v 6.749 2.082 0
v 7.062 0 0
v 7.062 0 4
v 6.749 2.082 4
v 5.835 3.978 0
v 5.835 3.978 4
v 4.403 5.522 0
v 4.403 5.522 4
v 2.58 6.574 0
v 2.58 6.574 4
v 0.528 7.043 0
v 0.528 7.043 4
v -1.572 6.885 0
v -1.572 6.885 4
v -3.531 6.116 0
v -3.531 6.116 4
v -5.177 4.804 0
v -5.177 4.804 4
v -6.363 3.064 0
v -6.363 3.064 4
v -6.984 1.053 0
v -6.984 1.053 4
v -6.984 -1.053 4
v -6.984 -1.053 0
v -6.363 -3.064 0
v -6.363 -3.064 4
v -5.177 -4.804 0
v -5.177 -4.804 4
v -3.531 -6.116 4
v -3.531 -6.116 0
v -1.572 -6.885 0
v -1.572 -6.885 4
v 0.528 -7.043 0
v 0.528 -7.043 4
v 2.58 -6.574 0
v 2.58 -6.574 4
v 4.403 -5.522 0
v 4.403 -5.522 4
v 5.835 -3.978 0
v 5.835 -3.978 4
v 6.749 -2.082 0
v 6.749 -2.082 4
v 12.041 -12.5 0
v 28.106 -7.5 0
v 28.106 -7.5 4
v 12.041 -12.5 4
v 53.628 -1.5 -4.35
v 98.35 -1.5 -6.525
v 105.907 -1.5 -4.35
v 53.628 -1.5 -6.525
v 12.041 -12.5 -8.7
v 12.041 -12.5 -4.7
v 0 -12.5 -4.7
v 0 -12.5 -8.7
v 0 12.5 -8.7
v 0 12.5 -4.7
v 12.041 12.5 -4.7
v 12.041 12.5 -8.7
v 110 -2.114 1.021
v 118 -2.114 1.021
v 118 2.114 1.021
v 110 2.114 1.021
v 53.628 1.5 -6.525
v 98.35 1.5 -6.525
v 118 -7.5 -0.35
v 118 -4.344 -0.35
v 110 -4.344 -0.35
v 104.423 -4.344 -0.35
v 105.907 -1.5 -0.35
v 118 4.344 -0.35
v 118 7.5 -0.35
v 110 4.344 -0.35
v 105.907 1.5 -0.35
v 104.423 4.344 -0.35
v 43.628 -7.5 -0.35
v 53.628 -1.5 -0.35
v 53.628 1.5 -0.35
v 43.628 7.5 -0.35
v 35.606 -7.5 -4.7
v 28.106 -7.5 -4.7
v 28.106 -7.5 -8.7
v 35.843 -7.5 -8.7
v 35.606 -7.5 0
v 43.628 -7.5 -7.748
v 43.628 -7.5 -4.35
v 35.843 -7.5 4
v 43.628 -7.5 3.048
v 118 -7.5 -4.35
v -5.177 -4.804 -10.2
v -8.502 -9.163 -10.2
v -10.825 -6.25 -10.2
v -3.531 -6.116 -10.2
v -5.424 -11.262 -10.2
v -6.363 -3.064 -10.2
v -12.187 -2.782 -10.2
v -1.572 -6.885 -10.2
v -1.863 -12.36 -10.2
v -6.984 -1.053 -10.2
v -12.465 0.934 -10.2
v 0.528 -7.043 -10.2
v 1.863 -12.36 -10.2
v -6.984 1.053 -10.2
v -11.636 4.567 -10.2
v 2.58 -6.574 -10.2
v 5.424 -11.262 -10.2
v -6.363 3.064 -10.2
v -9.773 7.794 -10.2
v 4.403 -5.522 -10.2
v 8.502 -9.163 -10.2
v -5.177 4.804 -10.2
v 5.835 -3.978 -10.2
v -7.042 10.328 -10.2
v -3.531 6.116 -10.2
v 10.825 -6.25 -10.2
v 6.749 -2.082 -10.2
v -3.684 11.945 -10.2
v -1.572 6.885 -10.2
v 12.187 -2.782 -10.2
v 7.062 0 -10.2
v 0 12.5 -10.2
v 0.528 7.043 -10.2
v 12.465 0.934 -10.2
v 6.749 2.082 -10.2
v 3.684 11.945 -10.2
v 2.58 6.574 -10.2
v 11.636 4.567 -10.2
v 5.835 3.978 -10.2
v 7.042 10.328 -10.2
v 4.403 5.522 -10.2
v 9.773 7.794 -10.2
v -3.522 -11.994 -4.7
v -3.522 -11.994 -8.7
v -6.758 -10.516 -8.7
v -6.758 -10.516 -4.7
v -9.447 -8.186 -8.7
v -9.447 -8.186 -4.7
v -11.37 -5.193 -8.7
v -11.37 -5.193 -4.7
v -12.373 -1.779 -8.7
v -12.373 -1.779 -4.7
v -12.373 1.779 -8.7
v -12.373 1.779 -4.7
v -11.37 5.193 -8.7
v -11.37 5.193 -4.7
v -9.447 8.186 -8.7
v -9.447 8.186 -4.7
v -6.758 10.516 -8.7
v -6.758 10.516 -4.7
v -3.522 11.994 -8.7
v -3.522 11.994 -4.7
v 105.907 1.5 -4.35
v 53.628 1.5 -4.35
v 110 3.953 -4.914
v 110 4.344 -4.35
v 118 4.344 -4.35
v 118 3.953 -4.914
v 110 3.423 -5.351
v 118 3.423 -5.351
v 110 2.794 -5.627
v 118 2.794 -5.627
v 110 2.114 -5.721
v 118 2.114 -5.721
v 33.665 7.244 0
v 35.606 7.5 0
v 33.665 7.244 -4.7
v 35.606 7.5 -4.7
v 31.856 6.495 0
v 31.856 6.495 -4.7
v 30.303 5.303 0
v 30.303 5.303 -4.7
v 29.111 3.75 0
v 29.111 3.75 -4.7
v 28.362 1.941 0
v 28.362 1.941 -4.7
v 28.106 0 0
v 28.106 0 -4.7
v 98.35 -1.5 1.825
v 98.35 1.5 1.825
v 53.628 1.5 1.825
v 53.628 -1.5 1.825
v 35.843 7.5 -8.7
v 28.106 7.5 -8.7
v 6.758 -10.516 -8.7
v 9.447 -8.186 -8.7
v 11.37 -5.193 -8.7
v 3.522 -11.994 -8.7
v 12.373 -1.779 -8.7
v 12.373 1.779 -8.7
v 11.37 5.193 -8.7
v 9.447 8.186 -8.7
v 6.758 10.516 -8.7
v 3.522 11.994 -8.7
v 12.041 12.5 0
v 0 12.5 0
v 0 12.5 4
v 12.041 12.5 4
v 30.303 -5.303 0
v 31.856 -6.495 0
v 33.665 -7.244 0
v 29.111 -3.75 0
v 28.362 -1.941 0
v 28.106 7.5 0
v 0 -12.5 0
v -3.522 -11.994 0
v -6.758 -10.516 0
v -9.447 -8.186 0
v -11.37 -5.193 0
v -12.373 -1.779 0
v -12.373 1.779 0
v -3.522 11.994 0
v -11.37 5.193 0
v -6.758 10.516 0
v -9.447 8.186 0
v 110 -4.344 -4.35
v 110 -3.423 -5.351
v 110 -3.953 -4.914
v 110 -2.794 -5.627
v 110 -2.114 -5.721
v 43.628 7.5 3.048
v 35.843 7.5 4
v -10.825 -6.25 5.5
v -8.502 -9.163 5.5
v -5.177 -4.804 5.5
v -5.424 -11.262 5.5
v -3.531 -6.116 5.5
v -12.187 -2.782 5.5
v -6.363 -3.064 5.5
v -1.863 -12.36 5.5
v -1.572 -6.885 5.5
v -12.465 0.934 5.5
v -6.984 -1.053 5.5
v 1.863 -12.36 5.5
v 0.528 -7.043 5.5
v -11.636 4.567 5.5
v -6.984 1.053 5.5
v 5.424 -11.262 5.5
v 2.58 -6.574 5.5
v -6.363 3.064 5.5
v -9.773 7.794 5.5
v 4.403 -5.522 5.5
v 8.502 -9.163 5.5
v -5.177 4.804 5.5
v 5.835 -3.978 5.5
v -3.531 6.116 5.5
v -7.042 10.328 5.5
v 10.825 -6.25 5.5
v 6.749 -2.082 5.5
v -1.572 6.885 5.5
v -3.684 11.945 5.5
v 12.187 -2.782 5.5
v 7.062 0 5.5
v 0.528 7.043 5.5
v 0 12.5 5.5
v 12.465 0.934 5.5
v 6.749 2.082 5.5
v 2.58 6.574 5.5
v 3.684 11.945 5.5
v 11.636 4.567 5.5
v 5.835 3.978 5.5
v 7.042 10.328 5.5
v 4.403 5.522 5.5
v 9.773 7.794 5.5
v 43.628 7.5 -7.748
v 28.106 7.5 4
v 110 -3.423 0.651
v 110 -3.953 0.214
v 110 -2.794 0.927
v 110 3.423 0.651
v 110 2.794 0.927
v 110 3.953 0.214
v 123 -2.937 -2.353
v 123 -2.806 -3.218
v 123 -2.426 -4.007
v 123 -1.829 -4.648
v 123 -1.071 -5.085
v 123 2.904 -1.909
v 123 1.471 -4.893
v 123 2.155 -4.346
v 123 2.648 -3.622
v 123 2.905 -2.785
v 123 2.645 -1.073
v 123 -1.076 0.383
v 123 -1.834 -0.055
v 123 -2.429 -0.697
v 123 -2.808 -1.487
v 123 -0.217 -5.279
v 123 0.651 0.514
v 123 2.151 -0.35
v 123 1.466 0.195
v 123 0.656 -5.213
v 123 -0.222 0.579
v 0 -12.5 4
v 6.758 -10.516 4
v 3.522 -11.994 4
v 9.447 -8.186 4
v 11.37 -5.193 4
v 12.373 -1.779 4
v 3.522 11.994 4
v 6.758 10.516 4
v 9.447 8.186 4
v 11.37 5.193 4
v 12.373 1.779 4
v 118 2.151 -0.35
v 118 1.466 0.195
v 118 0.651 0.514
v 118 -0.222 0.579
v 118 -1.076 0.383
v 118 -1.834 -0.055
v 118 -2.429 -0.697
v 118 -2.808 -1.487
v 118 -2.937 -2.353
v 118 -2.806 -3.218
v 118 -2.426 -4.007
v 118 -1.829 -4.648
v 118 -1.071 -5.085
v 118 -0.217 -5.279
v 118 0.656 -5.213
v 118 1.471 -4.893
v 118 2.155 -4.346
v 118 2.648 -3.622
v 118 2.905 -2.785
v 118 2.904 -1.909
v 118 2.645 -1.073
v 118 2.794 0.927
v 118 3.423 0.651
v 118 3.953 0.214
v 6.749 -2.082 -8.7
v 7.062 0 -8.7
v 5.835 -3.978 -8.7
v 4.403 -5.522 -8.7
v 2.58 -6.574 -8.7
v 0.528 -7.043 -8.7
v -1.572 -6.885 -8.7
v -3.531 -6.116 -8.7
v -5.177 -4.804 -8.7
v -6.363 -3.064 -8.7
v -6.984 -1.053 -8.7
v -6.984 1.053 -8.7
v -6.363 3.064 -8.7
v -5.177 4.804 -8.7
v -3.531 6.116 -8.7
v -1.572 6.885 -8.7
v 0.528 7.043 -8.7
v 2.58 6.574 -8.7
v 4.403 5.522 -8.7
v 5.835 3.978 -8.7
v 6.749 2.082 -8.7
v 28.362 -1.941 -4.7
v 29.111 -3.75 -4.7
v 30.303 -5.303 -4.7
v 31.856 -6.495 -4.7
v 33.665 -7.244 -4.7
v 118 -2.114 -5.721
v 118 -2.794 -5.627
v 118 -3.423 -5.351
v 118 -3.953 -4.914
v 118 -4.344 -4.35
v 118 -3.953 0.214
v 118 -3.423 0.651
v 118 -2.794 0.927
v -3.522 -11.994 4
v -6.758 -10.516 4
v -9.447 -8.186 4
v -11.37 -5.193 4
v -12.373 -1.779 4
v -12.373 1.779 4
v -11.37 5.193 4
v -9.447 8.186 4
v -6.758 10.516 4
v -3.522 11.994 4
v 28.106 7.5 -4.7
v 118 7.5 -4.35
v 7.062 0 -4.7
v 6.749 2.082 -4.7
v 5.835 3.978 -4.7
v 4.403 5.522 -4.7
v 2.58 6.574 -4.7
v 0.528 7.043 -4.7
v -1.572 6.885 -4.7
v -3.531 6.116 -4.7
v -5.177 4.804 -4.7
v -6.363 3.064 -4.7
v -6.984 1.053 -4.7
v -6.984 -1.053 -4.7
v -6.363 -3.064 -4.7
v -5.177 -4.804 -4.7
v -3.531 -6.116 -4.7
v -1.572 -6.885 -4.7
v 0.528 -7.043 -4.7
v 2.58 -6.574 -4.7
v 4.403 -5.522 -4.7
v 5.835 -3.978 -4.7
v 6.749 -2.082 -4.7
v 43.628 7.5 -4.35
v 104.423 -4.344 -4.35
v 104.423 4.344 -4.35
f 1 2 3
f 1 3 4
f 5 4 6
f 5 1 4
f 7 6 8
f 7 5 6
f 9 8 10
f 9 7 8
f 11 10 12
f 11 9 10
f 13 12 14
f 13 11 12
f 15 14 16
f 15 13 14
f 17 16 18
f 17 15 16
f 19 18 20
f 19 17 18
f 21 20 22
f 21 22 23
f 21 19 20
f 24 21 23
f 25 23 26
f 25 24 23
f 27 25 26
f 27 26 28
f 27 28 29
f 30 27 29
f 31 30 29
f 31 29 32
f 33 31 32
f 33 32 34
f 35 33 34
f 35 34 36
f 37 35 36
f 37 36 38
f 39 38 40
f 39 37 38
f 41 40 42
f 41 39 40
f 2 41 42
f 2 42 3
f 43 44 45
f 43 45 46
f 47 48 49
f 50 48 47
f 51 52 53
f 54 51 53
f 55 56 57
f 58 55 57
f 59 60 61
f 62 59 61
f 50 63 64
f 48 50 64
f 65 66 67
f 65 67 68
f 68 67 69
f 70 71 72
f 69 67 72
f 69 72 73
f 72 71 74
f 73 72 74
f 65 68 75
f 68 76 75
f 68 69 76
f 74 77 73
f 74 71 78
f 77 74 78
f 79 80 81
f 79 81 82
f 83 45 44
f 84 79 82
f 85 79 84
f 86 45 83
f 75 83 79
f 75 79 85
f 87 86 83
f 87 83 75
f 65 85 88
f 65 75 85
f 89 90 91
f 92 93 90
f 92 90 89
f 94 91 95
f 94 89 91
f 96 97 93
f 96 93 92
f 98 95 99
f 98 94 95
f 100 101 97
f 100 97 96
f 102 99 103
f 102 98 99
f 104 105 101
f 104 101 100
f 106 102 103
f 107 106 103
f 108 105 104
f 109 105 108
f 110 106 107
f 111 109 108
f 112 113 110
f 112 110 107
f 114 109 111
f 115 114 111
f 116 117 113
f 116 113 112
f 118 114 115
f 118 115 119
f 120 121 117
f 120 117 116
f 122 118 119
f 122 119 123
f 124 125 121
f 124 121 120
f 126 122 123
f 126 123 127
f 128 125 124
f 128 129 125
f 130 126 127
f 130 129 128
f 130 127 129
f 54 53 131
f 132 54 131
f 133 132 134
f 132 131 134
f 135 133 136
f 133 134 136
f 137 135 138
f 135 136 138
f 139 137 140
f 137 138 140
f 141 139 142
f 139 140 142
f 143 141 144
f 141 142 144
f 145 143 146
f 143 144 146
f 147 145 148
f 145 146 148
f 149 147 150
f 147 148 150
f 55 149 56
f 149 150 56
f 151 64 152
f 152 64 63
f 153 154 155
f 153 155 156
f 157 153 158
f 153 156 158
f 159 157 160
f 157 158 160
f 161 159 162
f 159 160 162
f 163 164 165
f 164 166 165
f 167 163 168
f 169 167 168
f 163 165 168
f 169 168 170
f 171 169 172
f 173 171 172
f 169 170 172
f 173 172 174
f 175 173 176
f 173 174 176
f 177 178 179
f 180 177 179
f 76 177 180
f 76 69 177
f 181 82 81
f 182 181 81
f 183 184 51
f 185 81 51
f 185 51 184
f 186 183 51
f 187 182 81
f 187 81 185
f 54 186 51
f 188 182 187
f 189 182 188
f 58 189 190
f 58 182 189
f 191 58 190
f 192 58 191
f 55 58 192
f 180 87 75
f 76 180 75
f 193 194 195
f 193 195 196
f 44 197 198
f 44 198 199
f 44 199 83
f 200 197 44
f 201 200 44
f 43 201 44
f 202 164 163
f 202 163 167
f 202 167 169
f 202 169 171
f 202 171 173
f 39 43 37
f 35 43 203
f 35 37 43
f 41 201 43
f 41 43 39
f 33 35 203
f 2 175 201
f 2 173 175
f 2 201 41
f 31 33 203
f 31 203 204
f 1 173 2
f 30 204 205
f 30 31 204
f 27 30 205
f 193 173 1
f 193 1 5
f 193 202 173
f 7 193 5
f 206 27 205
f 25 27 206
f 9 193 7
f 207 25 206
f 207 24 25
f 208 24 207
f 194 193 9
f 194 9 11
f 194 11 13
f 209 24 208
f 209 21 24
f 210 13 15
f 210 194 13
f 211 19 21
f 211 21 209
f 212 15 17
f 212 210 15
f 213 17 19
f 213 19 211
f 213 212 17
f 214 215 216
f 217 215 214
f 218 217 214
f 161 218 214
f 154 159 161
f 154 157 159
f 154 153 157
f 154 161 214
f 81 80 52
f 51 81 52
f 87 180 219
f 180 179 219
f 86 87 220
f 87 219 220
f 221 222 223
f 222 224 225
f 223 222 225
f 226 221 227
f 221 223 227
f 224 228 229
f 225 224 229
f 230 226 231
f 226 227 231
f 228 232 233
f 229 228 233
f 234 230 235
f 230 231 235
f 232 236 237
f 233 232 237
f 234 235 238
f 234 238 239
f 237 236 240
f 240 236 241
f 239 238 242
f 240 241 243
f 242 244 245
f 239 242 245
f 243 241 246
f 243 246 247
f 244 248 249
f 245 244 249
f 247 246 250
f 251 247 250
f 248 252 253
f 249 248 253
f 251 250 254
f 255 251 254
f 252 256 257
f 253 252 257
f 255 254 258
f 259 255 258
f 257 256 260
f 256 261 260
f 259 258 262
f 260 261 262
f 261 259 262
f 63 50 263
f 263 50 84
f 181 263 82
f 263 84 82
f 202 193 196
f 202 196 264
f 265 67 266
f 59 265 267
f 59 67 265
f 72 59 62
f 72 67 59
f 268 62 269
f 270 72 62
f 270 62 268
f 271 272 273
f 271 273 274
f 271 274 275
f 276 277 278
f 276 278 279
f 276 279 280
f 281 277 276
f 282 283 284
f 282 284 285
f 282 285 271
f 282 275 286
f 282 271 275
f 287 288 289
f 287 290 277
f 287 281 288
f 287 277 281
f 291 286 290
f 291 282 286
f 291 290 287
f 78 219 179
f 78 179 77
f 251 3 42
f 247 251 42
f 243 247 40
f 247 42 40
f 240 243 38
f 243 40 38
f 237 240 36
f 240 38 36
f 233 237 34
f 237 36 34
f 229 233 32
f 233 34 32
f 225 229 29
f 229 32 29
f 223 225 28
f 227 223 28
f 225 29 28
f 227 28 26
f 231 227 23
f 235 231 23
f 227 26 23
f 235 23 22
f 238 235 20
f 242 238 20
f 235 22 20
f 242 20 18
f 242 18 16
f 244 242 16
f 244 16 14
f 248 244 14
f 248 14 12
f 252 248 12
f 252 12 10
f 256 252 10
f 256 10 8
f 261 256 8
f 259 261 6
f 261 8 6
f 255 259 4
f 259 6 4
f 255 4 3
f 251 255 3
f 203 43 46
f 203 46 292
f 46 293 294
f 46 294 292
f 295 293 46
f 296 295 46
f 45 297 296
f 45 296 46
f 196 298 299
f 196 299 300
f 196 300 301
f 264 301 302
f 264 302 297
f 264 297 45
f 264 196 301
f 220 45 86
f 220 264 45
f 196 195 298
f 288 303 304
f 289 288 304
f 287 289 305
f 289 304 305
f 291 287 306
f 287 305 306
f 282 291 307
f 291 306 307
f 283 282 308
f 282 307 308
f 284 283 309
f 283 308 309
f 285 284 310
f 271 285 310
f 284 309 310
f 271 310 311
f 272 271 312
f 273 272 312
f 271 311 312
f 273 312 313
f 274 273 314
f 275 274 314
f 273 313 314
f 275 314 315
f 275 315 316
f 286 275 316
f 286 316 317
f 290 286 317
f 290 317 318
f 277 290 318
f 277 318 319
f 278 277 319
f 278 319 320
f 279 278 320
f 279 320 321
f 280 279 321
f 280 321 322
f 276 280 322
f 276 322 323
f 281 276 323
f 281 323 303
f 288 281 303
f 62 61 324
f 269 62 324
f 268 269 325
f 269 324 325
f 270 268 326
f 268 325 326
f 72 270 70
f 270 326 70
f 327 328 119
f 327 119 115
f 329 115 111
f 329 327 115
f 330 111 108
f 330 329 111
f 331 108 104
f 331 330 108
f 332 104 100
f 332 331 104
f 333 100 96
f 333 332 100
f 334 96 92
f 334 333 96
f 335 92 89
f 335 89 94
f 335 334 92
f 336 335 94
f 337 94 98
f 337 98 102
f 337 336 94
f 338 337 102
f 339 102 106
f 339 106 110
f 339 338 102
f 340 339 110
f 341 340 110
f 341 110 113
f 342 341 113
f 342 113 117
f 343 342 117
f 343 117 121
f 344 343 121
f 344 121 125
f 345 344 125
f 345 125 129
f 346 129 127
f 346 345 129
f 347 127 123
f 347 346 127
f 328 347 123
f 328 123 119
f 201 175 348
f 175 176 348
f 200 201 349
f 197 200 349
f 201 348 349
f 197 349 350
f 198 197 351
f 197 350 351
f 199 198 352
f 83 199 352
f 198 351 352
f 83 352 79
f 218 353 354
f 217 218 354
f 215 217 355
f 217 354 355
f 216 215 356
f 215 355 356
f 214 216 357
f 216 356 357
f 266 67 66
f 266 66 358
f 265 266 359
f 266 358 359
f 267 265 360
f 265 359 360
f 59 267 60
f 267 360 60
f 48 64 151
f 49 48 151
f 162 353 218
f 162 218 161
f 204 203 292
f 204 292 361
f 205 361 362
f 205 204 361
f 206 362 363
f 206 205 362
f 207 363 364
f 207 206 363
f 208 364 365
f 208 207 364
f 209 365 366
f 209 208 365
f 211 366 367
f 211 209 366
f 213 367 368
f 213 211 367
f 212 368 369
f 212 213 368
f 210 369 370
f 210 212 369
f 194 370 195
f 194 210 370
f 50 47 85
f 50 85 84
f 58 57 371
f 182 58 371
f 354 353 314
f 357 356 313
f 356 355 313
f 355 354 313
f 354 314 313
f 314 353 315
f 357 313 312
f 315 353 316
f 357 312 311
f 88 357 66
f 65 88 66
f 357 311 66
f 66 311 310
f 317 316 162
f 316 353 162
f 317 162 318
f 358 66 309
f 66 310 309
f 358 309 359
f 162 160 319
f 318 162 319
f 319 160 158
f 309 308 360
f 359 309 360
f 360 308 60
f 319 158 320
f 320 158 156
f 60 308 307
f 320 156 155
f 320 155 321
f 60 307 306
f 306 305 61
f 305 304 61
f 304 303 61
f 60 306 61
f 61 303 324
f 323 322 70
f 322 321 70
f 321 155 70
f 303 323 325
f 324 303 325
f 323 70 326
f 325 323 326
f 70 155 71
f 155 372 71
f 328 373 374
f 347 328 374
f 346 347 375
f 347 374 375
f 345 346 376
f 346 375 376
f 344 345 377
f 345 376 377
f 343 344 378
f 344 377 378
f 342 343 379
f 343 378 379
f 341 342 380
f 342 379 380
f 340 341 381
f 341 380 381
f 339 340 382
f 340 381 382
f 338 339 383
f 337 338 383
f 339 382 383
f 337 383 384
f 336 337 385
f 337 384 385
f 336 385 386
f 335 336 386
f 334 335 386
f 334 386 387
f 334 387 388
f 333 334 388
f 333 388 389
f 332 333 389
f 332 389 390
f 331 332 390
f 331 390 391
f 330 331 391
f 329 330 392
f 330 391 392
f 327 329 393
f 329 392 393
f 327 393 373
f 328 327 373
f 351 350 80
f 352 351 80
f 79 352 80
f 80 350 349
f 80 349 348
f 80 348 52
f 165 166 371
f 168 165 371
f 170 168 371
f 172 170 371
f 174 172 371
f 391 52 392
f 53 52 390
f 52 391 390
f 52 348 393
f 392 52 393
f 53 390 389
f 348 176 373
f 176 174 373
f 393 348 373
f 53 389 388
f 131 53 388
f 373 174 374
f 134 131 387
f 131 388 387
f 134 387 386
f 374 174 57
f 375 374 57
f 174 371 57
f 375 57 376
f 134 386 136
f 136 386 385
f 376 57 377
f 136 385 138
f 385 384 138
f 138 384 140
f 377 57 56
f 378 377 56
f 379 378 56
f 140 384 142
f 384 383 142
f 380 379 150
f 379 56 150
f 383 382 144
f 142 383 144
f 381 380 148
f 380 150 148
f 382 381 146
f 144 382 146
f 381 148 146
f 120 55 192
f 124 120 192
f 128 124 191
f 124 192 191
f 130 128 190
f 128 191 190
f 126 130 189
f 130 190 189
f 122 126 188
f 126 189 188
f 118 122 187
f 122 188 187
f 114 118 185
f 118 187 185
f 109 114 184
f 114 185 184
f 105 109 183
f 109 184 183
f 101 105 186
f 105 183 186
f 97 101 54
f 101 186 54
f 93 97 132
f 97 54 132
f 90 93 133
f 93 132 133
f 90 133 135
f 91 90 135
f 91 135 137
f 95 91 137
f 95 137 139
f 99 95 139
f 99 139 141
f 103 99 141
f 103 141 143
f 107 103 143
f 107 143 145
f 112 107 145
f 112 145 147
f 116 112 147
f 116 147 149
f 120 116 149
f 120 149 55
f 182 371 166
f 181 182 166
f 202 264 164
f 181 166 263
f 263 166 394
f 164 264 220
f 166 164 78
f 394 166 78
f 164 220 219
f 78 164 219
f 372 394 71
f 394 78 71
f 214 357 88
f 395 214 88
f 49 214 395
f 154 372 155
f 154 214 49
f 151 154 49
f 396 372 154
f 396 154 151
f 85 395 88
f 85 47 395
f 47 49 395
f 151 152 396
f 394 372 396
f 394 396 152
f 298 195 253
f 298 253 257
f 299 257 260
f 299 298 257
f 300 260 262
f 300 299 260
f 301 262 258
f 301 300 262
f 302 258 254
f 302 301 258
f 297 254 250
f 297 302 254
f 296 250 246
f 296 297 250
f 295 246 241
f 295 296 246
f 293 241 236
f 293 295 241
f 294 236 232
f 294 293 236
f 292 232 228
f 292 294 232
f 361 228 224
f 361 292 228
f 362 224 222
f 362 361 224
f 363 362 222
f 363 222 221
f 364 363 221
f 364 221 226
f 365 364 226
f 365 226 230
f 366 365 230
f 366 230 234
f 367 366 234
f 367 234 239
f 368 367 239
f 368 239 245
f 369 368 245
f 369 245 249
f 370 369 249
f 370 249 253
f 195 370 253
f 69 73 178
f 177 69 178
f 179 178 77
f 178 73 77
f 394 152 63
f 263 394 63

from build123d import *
from OCP.BRepFilletAPI import BRepFilletAPI_MakeChamfer
from build123d.topology import SkipClean

# Parameters (mm, degrees)
SKETCH1_R           = 7.0625
BOSS_EXTRUDE1_DEPTH = 4
SKETCH5_W           = 25.521905645
SKETCH5_H           = 15
BOSS_EXTRUDE2_DEPTH = 12.7
FILLET1_R           = 7.5
SKETCH6_W           = 64.371907972
SKETCH6_H           = 15
BOSS_EXTRUDE3_DEPTH = 2
CHAMFER1_SIZE       = 10
CHAMFER1_SIZE2      = 6
CHAMFER2_SIZE       = 6
CHAMFER2_SIZE2      = 10
SKETCH8_R           = 2.9375
BOSS_EXTRUDE4_DEPTH = 5
BOSS_EXTRUDE5_DEPTH = 1.5
CUT_EXTRUDE1_DEPTH  = 7.5
SKETCH11_W          = 6.742622272
SKETCH11_H          = 8.688704154
BOSS_EXTRUDE7_DEPTH = 8
FILLET2_R           = 2.5
SKETCH12_R          = 12.5
SKETCH12_R_2        = 7.0625
BOSS_EXTRUDE8_DEPTH = 1.5


# Some blends are built 0.0001 mm under size
with BuildPart() as part:
    # Sketch1 → Boss-Extrude1 (new body)
    with BuildSketch(Plane.XY):
        with BuildLine():
            Line((0, 12.5), (12.041321952, 12.5))
            Line((12.041321952, 12.5), (28.106186383, 7.5))
            Line((28.106186383, 7.5), (28.106186383, -7.5))
            Line((28.106186383, -7.5), (12.041321952, -12.5))
            Line((12.041321952, -12.5), (0, -12.5))
            ThreePointArc((0, -12.5), (-12.5, 0), (0, 12.5))
        make_face()
        Circle(SKETCH1_R, mode=Mode.SUBTRACT)
    boss_extrude1 = extrude(amount=BOSS_EXTRUDE1_DEPTH)

    # Sketch5 → Boss-Extrude2 (add)
    with BuildSketch(Plane.XY.offset(4)):
        with Locations((40.867139206, 0)):
            Rectangle(SKETCH5_W, SKETCH5_H)
    extrude(amount=-BOSS_EXTRUDE2_DEPTH)

    # Mirror1: Boss-Extrude1 across plane
    add(boss_extrude1.mirror(Plane(origin=(0, 0, -2.35), x_dir=(1, 0, 0), z_dir=(0, 0, -1))))

    # Fillet1
    fillet1_edges = [part.edges().sort_by_distance(p)[0] for p in [
        (28.106186383, -7.5, -2.35),
        (28.106186383, 7.5, -2.35),
    ]]
    fillet(fillet1_edges, radius=FILLET1_R - 0.0001)  # a hair under: the kernel refuses the full size

    # Sketch6 → Boss-Extrude3 (add, symmetric)
    with BuildSketch(Plane(origin=(0, 0, -2.35), x_dir=(-1, 0, 0), z_dir=(0, 0, -1))):
        with Locations((-85.814046014, 0)):
            Rectangle(SKETCH6_W, SKETCH6_H)
    extrude(amount=BOSS_EXTRUDE3_DEPTH, both=True)

    # Chamfer1
    chamfer1_edges = [part.edges().sort_by_distance(p)[0] for p in [
        (53.628092028, 7.5, -6.525),
        (53.628092028, 7.5, 1.825),
    ]]
    chamfer1_side = [part.faces().sort_by_distance(p)[0] for p in [
        (62.630754808, 7.5, -2.35),
    ]]
    chamfer(chamfer1_edges, length=CHAMFER1_SIZE, length2=CHAMFER1_SIZE2, reference=chamfer1_side[0])

    # Chamfer2: one chamfer whose edges measure the first distance from different faces: ONE call of the kernel's chamfer builder (chamfer() names one face for all edges)
    chamfer2_edges_1 = [part.edges().sort_by_distance(p)[0] for p in [
        (53.628092028, -7.5, -6.525),
    ]]
    chamfer2_side_1 = [part.faces().sort_by_distance(p)[0] for p in [
        (53.628092028, -3, -6.525),
    ]]
    chamfer2_edges_2 = [part.edges().sort_by_distance(p)[0] for p in [
        (53.628092028, -7.5, 1.825),
    ]]
    chamfer2_side_2 = [part.faces().sort_by_distance(p)[0] for p in [
        (53.628092028, -3, 1.825),
    ]]
    chamfer2 = BRepFilletAPI_MakeChamfer(part.part.solid().wrapped)
    for e in chamfer2_edges_1:
        chamfer2.Add(CHAMFER2_SIZE, CHAMFER2_SIZE2, e.wrapped, chamfer2_side_1[0].wrapped)  # the first distance lies on this face
    for e in chamfer2_edges_2:
        chamfer2.Add(CHAMFER2_SIZE, CHAMFER2_SIZE2, e.wrapped, chamfer2_side_2[0].wrapped)  # the first distance lies on this face
    add(Compound.cast(chamfer2.Shape()), mode=Mode.REPLACE)

    # Sketch8 → Boss-Extrude4 (add)
    with BuildSketch(Plane(origin=(118, 0, 0), x_dir=(0, 0, -1), z_dir=(1, 0, 0))):
        with Locations(Location((2.35, 0, 0), (0, 0, 132.910184022))):
            Circle(SKETCH8_R)
    extrude(amount=BOSS_EXTRUDE4_DEPTH)

    # Sketch9 → Boss-Extrude5 (add, symmetric)
    with BuildSketch(Plane(origin=(0, 0, 0), x_dir=(1, 0, 0), z_dir=(0, 1, 0))):
        Polygon((53.628092028, 6.525), (98.349917778, 6.525), (112.85605343, 2.35), (98.349917778, -1.825), (53.628092028, -1.825), align=None)
    extrude(amount=BOSS_EXTRUDE5_DEPTH, both=True)

    # Sketch10 → Cut-Extrude1 (cut, symmetric)
    with BuildSketch(Plane(origin=(0, 0, 0), x_dir=(1, 0, 0), z_dir=(0, 1, 0))):
        Polygon((53.628092028, 6.525), (35.842858925, 8.7), (53.628092028, 8.7), align=None)
        Polygon((53.628092028, -1.825), (35.842858925, -4), (53.628092028, -4), align=None)
    extrude(amount=CUT_EXTRUDE1_DEPTH, both=True, mode=Mode.SUBTRACT)

    # Sketch11 → Boss-Extrude7 (add)
    with BuildSketch(Plane.ZY.offset(-118)):
        with Locations((-2.35, 0)):
            Rectangle(SKETCH11_W, SKETCH11_H)
    extrude(amount=BOSS_EXTRUDE7_DEPTH)

    # Fillet2
    # the kernel refuses this fillet: 2.5 mm, written as the material it takes off along each edge
    with BuildSketch(Plane(origin=(123.576771831, 4.344352077, 1.021311136), x_dir=(0, -1, 0), z_dir=(-1, 0, 0)), Plane(origin=(123.576771831, -4.344352077, -5.721311136), x_dir=(0, 1, 0), z_dir=(-1, 0, 0))) as fillet2_piece_1:
        with BuildLine():
            CenterArc((2.230708732, -2.5), FILLET2_R, 90, 63.161607103)
            Line((0, -1.371311136), (-0.044614175, -1.348737359))
            ThreePointArc((-0.044614175, -1.348737359), (-0.05, -0.685655568), (-0.05, 0))
            Line((-0.05, 0), (0, 0.05))
            Line((0, 0.05), (2.230708732, 0.05))
            Line((2.230708732, 0.05), (2.230708732, 0))
        make_face()
    extrude(amount=19.153543662, mode=Mode.SUBTRACT)
    with BuildSketch(Plane(origin=(123.576771831, -4.344352077, 1.021311136), x_dir=(0, 0, -1), z_dir=(-1, 0, 0)), Plane(origin=(123.576771831, 4.344352077, -5.721311136), x_dir=(0, 0, 1), z_dir=(-1, 0, 0))) as fillet2_piece_2:
        with BuildLine():
            CenterArc((2.5, -2.230708732), FILLET2_R, 116.838392897, 63.161607103)
            Line((0, -2.230708732), (-0.05, -2.230708732))
            Line((-0.05, -2.230708732), (-0.05, 0))
            Line((-0.05, 0), (0, 0.05))
            ThreePointArc((0, 0.05), (0.685655568, 0.05), (1.348737359, 0.044614175))
            Line((1.348737359, 0.044614175), (1.371311136, 0))
        make_face()
    extrude(amount=19.153543662, mode=Mode.SUBTRACT)

    # Sketch12 → Boss-Extrude8 (add)
    with SkipClean():  # the faces are left unmerged after this step: merging them gives an invalid solid
        with BuildSketch(Plane(origin=(0, 0, -8.7), x_dir=(-1, 0, 0), z_dir=(0, 0, -1))):
            with Locations(Location((0, 0, 0), (0, 0, 90))):
                Circle(SKETCH12_R)
            with Locations(Location((0, 0, 0), (0, 0, 180))):
                Circle(SKETCH12_R_2, mode=Mode.SUBTRACT)
        boss_extrude8 = extrude(amount=BOSS_EXTRUDE8_DEPTH)

    # Mirror2: Boss-Extrude8 across plane
    with SkipClean():  # the faces are left unmerged after this step: merging them gives an invalid solid
        add(boss_extrude8.mirror(Plane(origin=(0, 0, -2.35), x_dir=(1, 0, 0), z_dir=(0, 0, -1))))


solid = part.part
